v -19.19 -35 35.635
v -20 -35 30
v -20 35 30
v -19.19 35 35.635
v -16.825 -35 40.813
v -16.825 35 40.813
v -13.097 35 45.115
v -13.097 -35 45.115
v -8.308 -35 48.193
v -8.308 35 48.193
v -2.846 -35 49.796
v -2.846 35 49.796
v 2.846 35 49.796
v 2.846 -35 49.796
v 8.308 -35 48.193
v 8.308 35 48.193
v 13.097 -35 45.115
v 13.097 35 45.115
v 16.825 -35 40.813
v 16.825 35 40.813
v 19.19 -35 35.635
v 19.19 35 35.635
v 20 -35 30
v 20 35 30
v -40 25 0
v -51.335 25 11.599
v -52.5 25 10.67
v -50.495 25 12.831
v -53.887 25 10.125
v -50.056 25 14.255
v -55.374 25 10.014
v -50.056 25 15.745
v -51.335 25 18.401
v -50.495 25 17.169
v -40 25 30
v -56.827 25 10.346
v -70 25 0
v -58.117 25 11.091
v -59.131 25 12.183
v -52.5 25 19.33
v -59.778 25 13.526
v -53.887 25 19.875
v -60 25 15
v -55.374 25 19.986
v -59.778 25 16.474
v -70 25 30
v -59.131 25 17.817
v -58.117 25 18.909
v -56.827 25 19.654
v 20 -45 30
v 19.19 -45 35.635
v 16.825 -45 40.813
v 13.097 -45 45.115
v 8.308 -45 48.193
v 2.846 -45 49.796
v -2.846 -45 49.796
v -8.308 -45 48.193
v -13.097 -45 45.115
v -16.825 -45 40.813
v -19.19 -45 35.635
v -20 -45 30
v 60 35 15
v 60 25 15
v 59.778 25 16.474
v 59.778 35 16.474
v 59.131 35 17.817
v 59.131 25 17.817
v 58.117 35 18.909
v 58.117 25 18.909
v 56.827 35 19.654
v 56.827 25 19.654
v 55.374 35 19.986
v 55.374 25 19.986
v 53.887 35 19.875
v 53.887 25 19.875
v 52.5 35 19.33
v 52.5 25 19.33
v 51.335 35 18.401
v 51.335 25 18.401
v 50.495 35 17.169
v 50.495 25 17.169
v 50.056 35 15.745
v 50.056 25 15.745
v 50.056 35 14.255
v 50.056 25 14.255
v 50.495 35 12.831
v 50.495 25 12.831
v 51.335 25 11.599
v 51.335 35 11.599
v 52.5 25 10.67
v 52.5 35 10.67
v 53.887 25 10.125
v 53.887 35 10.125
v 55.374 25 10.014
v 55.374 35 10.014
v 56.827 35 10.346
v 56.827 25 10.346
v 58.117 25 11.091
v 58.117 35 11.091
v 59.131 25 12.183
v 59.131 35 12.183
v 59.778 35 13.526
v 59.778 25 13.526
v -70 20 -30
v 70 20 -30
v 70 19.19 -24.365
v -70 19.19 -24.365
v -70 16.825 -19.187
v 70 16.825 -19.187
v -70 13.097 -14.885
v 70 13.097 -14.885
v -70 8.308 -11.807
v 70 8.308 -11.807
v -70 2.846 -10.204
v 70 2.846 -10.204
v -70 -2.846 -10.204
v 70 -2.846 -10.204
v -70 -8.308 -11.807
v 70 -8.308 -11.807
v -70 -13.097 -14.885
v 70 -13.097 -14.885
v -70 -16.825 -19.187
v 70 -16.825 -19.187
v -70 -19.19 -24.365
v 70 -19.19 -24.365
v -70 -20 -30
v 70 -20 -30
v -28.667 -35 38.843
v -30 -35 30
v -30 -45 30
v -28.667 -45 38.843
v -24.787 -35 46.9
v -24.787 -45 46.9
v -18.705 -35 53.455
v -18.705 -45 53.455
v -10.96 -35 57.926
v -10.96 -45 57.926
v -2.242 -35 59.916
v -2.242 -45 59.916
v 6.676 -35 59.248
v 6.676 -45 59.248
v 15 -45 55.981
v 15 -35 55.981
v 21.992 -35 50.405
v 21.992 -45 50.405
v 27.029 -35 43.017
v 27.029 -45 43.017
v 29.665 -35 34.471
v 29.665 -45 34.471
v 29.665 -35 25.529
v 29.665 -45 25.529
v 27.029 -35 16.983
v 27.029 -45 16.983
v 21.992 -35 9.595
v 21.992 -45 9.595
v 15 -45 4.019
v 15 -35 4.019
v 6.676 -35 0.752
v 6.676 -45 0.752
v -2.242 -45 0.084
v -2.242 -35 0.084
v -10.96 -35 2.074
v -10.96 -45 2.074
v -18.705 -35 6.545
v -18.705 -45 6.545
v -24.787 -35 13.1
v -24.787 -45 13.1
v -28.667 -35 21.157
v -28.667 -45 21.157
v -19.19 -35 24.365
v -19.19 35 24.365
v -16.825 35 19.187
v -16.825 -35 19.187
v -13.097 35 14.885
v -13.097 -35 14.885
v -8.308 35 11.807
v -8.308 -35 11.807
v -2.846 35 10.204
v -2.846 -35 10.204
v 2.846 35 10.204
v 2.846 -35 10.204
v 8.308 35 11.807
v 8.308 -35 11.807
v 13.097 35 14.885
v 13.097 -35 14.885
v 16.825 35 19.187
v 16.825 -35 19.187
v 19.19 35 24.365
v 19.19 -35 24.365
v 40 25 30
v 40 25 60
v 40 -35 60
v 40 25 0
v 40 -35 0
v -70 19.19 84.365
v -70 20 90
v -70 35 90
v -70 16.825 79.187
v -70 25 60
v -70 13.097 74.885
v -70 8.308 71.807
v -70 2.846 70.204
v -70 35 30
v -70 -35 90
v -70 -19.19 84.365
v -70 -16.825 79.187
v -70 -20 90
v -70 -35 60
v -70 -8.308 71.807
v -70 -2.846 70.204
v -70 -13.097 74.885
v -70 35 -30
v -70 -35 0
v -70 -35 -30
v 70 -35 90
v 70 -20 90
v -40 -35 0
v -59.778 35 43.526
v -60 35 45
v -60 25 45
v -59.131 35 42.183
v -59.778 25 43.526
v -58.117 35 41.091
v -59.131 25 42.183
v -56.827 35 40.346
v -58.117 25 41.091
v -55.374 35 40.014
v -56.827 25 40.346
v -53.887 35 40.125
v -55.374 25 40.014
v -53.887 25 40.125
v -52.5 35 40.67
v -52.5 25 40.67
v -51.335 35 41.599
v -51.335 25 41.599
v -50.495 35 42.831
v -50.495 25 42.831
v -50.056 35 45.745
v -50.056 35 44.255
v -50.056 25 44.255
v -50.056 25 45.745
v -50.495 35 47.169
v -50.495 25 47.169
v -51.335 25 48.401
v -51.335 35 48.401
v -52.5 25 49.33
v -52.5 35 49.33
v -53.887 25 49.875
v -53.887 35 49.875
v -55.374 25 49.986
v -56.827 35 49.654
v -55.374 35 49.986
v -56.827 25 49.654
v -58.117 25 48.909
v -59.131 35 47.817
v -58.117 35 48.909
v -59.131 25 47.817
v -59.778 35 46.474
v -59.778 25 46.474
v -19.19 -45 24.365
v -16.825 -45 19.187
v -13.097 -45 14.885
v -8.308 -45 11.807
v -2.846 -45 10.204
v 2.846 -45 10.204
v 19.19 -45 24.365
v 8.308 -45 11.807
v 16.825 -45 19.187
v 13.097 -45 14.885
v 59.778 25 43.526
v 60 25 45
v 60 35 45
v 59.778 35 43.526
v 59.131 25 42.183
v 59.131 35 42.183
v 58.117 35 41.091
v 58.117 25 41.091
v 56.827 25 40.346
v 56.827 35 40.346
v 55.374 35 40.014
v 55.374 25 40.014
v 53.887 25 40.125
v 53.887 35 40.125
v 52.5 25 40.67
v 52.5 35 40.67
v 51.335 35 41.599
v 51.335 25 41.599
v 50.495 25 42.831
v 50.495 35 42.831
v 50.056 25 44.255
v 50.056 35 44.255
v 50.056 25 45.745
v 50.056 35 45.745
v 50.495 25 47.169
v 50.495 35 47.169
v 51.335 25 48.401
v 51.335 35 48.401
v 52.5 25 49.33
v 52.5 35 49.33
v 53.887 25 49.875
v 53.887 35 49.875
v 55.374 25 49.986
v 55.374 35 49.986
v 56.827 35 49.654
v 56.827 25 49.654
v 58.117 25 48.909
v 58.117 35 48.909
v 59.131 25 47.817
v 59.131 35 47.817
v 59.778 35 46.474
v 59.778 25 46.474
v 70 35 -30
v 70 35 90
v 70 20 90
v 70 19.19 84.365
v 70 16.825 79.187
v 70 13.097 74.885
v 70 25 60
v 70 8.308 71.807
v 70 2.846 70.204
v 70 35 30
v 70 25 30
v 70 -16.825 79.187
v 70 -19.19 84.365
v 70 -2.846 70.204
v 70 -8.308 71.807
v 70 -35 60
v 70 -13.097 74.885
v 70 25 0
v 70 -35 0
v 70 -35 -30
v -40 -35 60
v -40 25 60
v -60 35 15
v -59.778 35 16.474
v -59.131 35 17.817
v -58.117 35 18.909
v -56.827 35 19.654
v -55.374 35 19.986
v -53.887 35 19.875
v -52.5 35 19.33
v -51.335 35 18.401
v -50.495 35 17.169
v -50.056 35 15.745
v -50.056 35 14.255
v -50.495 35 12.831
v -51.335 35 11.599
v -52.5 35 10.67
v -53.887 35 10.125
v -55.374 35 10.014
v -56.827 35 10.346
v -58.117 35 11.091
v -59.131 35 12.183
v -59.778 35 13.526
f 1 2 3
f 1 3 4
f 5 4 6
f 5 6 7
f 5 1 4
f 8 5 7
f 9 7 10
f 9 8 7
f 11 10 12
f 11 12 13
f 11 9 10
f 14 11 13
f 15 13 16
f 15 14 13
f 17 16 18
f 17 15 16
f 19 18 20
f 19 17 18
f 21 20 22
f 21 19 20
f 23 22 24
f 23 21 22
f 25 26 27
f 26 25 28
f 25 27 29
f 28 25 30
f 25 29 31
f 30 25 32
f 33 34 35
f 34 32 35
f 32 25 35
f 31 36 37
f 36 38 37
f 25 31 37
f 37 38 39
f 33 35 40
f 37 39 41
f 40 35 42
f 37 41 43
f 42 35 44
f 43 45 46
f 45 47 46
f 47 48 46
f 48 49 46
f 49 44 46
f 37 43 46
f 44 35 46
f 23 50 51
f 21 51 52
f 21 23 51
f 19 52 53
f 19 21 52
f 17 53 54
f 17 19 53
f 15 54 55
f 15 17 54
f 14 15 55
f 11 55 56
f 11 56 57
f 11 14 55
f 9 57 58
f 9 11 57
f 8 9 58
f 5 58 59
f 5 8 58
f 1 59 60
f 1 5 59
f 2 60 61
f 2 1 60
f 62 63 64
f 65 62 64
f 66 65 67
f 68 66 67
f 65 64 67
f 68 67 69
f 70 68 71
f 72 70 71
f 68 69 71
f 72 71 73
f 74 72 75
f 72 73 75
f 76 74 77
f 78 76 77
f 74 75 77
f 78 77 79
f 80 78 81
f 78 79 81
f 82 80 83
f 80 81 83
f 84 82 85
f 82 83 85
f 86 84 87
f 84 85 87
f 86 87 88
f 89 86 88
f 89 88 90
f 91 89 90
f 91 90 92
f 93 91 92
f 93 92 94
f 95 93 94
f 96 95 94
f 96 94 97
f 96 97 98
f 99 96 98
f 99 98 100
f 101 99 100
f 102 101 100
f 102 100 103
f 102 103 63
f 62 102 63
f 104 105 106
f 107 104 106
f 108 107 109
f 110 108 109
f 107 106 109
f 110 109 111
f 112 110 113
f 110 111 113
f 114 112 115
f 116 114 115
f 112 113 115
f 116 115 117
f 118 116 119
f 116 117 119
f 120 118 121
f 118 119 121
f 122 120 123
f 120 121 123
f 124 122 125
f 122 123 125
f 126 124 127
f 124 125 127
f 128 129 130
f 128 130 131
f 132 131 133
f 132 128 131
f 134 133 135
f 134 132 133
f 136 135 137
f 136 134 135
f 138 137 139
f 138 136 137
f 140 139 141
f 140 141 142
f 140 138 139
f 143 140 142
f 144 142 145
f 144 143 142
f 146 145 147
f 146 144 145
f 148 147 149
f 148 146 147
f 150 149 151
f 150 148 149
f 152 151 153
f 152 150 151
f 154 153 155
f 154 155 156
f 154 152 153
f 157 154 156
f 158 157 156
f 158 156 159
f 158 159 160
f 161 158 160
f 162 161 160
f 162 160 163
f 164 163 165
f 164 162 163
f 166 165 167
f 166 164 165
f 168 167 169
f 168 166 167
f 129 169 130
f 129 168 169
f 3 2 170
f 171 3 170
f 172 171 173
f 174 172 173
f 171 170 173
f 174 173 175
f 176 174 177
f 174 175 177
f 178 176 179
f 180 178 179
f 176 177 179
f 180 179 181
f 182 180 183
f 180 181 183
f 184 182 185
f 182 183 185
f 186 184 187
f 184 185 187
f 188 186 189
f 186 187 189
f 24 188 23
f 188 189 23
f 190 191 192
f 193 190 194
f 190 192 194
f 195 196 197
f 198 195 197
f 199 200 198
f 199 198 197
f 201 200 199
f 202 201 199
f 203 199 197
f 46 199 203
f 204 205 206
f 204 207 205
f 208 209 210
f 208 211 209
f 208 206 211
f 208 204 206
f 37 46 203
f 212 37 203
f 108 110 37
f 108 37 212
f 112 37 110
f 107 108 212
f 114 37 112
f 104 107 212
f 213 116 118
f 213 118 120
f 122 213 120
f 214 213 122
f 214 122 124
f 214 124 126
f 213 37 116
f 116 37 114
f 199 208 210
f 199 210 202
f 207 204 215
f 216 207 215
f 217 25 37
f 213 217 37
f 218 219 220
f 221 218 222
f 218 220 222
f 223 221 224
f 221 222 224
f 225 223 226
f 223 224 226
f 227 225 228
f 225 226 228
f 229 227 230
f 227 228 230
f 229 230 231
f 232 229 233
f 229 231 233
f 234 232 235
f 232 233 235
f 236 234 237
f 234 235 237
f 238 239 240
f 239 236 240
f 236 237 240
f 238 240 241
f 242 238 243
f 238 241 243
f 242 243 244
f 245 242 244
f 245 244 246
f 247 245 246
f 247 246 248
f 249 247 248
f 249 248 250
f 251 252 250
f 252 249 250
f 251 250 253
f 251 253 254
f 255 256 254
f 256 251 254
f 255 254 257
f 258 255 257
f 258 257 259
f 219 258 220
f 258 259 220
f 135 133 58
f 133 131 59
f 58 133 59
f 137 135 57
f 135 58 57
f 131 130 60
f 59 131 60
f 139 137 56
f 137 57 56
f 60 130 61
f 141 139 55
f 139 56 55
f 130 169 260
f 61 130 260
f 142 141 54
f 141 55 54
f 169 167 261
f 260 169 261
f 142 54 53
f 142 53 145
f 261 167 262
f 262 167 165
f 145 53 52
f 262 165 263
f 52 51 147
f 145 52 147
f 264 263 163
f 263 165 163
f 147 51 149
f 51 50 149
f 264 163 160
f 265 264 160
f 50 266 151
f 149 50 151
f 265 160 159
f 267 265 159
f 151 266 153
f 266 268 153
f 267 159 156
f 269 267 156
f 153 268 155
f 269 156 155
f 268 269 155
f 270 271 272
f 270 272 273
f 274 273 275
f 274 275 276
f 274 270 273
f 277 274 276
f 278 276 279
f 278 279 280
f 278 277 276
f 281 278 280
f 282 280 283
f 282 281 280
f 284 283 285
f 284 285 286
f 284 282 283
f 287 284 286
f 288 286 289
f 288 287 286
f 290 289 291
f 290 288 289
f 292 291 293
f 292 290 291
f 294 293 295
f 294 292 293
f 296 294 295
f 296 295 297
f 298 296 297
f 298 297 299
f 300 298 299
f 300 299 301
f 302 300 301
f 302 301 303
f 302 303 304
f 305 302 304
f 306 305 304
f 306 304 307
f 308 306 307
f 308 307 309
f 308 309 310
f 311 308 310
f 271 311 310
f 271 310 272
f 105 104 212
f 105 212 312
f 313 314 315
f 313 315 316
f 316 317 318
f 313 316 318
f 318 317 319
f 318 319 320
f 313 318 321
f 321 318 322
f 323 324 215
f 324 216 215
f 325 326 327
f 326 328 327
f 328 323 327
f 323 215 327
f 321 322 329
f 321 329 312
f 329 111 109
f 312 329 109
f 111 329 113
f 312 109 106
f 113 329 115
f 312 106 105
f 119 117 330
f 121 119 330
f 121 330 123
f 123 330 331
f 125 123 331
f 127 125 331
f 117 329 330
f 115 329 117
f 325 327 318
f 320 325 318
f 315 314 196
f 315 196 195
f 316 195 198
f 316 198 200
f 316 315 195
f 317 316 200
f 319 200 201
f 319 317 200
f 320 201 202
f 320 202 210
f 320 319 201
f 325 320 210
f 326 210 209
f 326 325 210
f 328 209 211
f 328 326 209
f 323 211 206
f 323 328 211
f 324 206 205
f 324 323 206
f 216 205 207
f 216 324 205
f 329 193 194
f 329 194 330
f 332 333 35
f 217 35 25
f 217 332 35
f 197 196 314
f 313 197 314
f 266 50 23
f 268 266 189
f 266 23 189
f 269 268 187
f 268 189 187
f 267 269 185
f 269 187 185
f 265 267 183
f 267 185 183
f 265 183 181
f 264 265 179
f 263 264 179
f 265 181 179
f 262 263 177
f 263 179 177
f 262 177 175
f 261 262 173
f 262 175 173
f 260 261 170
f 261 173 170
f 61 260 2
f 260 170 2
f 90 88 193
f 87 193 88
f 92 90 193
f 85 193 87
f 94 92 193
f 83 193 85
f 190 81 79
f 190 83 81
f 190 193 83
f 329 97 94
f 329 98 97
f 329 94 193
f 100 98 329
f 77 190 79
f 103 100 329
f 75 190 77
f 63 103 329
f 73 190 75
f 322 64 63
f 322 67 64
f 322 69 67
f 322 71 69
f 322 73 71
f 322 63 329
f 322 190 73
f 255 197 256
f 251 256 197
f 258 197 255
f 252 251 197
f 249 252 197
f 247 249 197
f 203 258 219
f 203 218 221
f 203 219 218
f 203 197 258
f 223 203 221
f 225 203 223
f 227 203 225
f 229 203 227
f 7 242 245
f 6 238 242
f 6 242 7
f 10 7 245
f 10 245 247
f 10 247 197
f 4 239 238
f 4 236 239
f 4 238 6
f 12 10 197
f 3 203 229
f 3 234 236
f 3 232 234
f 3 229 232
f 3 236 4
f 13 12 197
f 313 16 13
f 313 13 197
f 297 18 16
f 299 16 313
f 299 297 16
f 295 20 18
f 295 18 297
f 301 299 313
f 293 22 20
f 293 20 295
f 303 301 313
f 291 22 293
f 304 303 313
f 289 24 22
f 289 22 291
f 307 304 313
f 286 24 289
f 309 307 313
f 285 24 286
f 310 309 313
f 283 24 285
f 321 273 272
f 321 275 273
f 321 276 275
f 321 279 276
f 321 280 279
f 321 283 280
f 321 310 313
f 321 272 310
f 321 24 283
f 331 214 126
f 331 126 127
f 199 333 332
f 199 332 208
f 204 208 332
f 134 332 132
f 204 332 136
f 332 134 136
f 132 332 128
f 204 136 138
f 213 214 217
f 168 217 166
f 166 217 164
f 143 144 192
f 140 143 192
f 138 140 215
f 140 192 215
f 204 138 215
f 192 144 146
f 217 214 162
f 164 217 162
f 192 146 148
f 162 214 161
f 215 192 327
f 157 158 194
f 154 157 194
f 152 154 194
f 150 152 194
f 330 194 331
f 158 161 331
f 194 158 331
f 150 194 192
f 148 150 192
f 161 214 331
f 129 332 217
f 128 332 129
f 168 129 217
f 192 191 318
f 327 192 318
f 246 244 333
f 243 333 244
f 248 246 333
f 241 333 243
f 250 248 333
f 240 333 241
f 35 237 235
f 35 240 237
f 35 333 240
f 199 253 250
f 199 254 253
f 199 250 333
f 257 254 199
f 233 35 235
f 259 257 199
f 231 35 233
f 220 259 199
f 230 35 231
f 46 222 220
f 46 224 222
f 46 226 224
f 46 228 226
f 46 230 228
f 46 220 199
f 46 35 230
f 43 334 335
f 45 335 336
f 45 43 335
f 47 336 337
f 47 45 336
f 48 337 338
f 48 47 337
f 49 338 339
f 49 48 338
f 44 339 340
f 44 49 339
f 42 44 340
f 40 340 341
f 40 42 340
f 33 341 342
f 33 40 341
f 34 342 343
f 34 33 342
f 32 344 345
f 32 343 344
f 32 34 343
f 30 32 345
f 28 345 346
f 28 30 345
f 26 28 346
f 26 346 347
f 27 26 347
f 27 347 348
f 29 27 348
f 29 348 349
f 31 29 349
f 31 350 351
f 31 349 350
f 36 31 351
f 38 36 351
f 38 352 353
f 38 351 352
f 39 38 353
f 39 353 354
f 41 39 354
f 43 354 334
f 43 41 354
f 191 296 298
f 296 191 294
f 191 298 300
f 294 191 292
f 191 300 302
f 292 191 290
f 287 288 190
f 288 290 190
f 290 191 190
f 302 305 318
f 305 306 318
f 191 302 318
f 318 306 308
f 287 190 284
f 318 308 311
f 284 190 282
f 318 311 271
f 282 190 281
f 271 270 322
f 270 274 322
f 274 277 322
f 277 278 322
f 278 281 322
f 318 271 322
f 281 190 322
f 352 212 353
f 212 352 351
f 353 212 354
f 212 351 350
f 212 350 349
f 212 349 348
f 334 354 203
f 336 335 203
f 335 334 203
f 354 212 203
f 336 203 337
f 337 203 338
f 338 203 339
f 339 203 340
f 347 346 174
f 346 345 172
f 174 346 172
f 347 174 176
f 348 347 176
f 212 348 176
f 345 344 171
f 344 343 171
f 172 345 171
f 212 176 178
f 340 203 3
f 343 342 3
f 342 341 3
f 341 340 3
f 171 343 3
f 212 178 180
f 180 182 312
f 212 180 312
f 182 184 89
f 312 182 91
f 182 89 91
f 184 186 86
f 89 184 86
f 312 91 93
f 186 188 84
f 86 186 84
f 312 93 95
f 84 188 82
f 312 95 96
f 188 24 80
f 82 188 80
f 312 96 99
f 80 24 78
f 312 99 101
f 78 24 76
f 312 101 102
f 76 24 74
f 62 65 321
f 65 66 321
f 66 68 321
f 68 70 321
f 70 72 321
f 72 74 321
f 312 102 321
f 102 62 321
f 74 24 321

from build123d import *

# Parameters (mm, degrees)
F0_W      = 140
F0_H      = 60
F1_DEPTH  = 35
F3_DEPTH  = 140.001
F4_W      = 30
F4_H      = 30
F5_DEPTH  = 60
F6_R      = 20
F7_DEPTH  = 72.1
F9_DEPTH  = 10
F11_DEPTH = 25
F12_R     = 5
F13_DEPTH = 25


# Not quite as in the source:
# - a pattern or mirror of a feature is missing from the dataset's text; its kind, count and spacing are read off the source's solid


with BuildPart() as f1:
    # F0 (on Front) → F1 (new body, symmetric)
    with BuildSketch(Plane.XZ):
        Rectangle(F0_W, F0_H)
    extrude(amount=F1_DEPTH, both=True)

    # F2 (on face) → F3 (cut, through all)
    with BuildSketch(Plane.YZ.offset(70)):
        with BuildLine():
            Line((-20, -30), (20, -30))
            ThreePointArc((20, -30), (0, -10), (-20, -30))
        make_face()
        with BuildLine():
            ThreePointArc((-20, -30), (0, -50), (20, -30))
            Line((20, -30), (-20, -30))
        make_face()
    extrude(amount=-F3_DEPTH, mode=Mode.SUBTRACT)

    # F4 (on face) → F5 (cut)
    with BuildSketch(Plane.XZ.offset(35)):
        with Locations((55, 15)):
            Rectangle(F4_W, F4_H)
    f5 = extrude(amount=-F5_DEPTH, mode=Mode.SUBTRACT)

    # F5_copies: F5 across plane
    add(f5.mirror(Plane(origin=(0, 0, 0), x_dir=(0, 0, -1), z_dir=(-1, 0, 0))), mode=Mode.SUBTRACT)

    # F6 (on face) → F7 (cut)
    with BuildSketch(Plane.XZ.offset(35)):
        with Locations((0, 30)):
            Circle(F6_R)
    extrude(amount=-F7_DEPTH, mode=Mode.SUBTRACT)

    # F8 (on face) → F9 (join)
    with BuildSketch(Plane.XZ.offset(35)):
        with BuildLine():
            Line((0, 30), (-30, 30))
            ThreePointArc((-30, 30), (0, 0), (30, 30))
            Line((30, 30), (0, 30))
        make_face()
    extrude(amount=F9_DEPTH)

    # F10 (on face) → F11 (cut)
    with BuildSketch(Plane(origin=(0, -35, 0), x_dir=(-1, 0, 0), z_dir=(0, 1, 0))):
        with BuildLine():
            ThreePointArc((-20, 30), (0, 10), (20, 30))
            Line((20, 30), (-20, 30))
        make_face()
    extrude(amount=-F11_DEPTH, mode=Mode.SUBTRACT)

    # F12 (on face) → F13 (cut)
    with BuildSketch(Plane.XZ.offset(-25)):
        with Locations((55, 15)):
            Circle(F12_R)
    f13 = extrude(amount=-F13_DEPTH, mode=Mode.SUBTRACT)

    # F13_copies: F13 across plane
    add(f13.mirror(Plane(origin=(0, 0, 0), x_dir=(0, 0, -1), z_dir=(-1, 0, 0))), mode=Mode.SUBTRACT)

    # F15: F1 across plane


with BuildPart() as f1_1:
    add(f1.part)
    add(f1.part.mirror(Plane.XY.offset(30)))


solid = f1_1.part
